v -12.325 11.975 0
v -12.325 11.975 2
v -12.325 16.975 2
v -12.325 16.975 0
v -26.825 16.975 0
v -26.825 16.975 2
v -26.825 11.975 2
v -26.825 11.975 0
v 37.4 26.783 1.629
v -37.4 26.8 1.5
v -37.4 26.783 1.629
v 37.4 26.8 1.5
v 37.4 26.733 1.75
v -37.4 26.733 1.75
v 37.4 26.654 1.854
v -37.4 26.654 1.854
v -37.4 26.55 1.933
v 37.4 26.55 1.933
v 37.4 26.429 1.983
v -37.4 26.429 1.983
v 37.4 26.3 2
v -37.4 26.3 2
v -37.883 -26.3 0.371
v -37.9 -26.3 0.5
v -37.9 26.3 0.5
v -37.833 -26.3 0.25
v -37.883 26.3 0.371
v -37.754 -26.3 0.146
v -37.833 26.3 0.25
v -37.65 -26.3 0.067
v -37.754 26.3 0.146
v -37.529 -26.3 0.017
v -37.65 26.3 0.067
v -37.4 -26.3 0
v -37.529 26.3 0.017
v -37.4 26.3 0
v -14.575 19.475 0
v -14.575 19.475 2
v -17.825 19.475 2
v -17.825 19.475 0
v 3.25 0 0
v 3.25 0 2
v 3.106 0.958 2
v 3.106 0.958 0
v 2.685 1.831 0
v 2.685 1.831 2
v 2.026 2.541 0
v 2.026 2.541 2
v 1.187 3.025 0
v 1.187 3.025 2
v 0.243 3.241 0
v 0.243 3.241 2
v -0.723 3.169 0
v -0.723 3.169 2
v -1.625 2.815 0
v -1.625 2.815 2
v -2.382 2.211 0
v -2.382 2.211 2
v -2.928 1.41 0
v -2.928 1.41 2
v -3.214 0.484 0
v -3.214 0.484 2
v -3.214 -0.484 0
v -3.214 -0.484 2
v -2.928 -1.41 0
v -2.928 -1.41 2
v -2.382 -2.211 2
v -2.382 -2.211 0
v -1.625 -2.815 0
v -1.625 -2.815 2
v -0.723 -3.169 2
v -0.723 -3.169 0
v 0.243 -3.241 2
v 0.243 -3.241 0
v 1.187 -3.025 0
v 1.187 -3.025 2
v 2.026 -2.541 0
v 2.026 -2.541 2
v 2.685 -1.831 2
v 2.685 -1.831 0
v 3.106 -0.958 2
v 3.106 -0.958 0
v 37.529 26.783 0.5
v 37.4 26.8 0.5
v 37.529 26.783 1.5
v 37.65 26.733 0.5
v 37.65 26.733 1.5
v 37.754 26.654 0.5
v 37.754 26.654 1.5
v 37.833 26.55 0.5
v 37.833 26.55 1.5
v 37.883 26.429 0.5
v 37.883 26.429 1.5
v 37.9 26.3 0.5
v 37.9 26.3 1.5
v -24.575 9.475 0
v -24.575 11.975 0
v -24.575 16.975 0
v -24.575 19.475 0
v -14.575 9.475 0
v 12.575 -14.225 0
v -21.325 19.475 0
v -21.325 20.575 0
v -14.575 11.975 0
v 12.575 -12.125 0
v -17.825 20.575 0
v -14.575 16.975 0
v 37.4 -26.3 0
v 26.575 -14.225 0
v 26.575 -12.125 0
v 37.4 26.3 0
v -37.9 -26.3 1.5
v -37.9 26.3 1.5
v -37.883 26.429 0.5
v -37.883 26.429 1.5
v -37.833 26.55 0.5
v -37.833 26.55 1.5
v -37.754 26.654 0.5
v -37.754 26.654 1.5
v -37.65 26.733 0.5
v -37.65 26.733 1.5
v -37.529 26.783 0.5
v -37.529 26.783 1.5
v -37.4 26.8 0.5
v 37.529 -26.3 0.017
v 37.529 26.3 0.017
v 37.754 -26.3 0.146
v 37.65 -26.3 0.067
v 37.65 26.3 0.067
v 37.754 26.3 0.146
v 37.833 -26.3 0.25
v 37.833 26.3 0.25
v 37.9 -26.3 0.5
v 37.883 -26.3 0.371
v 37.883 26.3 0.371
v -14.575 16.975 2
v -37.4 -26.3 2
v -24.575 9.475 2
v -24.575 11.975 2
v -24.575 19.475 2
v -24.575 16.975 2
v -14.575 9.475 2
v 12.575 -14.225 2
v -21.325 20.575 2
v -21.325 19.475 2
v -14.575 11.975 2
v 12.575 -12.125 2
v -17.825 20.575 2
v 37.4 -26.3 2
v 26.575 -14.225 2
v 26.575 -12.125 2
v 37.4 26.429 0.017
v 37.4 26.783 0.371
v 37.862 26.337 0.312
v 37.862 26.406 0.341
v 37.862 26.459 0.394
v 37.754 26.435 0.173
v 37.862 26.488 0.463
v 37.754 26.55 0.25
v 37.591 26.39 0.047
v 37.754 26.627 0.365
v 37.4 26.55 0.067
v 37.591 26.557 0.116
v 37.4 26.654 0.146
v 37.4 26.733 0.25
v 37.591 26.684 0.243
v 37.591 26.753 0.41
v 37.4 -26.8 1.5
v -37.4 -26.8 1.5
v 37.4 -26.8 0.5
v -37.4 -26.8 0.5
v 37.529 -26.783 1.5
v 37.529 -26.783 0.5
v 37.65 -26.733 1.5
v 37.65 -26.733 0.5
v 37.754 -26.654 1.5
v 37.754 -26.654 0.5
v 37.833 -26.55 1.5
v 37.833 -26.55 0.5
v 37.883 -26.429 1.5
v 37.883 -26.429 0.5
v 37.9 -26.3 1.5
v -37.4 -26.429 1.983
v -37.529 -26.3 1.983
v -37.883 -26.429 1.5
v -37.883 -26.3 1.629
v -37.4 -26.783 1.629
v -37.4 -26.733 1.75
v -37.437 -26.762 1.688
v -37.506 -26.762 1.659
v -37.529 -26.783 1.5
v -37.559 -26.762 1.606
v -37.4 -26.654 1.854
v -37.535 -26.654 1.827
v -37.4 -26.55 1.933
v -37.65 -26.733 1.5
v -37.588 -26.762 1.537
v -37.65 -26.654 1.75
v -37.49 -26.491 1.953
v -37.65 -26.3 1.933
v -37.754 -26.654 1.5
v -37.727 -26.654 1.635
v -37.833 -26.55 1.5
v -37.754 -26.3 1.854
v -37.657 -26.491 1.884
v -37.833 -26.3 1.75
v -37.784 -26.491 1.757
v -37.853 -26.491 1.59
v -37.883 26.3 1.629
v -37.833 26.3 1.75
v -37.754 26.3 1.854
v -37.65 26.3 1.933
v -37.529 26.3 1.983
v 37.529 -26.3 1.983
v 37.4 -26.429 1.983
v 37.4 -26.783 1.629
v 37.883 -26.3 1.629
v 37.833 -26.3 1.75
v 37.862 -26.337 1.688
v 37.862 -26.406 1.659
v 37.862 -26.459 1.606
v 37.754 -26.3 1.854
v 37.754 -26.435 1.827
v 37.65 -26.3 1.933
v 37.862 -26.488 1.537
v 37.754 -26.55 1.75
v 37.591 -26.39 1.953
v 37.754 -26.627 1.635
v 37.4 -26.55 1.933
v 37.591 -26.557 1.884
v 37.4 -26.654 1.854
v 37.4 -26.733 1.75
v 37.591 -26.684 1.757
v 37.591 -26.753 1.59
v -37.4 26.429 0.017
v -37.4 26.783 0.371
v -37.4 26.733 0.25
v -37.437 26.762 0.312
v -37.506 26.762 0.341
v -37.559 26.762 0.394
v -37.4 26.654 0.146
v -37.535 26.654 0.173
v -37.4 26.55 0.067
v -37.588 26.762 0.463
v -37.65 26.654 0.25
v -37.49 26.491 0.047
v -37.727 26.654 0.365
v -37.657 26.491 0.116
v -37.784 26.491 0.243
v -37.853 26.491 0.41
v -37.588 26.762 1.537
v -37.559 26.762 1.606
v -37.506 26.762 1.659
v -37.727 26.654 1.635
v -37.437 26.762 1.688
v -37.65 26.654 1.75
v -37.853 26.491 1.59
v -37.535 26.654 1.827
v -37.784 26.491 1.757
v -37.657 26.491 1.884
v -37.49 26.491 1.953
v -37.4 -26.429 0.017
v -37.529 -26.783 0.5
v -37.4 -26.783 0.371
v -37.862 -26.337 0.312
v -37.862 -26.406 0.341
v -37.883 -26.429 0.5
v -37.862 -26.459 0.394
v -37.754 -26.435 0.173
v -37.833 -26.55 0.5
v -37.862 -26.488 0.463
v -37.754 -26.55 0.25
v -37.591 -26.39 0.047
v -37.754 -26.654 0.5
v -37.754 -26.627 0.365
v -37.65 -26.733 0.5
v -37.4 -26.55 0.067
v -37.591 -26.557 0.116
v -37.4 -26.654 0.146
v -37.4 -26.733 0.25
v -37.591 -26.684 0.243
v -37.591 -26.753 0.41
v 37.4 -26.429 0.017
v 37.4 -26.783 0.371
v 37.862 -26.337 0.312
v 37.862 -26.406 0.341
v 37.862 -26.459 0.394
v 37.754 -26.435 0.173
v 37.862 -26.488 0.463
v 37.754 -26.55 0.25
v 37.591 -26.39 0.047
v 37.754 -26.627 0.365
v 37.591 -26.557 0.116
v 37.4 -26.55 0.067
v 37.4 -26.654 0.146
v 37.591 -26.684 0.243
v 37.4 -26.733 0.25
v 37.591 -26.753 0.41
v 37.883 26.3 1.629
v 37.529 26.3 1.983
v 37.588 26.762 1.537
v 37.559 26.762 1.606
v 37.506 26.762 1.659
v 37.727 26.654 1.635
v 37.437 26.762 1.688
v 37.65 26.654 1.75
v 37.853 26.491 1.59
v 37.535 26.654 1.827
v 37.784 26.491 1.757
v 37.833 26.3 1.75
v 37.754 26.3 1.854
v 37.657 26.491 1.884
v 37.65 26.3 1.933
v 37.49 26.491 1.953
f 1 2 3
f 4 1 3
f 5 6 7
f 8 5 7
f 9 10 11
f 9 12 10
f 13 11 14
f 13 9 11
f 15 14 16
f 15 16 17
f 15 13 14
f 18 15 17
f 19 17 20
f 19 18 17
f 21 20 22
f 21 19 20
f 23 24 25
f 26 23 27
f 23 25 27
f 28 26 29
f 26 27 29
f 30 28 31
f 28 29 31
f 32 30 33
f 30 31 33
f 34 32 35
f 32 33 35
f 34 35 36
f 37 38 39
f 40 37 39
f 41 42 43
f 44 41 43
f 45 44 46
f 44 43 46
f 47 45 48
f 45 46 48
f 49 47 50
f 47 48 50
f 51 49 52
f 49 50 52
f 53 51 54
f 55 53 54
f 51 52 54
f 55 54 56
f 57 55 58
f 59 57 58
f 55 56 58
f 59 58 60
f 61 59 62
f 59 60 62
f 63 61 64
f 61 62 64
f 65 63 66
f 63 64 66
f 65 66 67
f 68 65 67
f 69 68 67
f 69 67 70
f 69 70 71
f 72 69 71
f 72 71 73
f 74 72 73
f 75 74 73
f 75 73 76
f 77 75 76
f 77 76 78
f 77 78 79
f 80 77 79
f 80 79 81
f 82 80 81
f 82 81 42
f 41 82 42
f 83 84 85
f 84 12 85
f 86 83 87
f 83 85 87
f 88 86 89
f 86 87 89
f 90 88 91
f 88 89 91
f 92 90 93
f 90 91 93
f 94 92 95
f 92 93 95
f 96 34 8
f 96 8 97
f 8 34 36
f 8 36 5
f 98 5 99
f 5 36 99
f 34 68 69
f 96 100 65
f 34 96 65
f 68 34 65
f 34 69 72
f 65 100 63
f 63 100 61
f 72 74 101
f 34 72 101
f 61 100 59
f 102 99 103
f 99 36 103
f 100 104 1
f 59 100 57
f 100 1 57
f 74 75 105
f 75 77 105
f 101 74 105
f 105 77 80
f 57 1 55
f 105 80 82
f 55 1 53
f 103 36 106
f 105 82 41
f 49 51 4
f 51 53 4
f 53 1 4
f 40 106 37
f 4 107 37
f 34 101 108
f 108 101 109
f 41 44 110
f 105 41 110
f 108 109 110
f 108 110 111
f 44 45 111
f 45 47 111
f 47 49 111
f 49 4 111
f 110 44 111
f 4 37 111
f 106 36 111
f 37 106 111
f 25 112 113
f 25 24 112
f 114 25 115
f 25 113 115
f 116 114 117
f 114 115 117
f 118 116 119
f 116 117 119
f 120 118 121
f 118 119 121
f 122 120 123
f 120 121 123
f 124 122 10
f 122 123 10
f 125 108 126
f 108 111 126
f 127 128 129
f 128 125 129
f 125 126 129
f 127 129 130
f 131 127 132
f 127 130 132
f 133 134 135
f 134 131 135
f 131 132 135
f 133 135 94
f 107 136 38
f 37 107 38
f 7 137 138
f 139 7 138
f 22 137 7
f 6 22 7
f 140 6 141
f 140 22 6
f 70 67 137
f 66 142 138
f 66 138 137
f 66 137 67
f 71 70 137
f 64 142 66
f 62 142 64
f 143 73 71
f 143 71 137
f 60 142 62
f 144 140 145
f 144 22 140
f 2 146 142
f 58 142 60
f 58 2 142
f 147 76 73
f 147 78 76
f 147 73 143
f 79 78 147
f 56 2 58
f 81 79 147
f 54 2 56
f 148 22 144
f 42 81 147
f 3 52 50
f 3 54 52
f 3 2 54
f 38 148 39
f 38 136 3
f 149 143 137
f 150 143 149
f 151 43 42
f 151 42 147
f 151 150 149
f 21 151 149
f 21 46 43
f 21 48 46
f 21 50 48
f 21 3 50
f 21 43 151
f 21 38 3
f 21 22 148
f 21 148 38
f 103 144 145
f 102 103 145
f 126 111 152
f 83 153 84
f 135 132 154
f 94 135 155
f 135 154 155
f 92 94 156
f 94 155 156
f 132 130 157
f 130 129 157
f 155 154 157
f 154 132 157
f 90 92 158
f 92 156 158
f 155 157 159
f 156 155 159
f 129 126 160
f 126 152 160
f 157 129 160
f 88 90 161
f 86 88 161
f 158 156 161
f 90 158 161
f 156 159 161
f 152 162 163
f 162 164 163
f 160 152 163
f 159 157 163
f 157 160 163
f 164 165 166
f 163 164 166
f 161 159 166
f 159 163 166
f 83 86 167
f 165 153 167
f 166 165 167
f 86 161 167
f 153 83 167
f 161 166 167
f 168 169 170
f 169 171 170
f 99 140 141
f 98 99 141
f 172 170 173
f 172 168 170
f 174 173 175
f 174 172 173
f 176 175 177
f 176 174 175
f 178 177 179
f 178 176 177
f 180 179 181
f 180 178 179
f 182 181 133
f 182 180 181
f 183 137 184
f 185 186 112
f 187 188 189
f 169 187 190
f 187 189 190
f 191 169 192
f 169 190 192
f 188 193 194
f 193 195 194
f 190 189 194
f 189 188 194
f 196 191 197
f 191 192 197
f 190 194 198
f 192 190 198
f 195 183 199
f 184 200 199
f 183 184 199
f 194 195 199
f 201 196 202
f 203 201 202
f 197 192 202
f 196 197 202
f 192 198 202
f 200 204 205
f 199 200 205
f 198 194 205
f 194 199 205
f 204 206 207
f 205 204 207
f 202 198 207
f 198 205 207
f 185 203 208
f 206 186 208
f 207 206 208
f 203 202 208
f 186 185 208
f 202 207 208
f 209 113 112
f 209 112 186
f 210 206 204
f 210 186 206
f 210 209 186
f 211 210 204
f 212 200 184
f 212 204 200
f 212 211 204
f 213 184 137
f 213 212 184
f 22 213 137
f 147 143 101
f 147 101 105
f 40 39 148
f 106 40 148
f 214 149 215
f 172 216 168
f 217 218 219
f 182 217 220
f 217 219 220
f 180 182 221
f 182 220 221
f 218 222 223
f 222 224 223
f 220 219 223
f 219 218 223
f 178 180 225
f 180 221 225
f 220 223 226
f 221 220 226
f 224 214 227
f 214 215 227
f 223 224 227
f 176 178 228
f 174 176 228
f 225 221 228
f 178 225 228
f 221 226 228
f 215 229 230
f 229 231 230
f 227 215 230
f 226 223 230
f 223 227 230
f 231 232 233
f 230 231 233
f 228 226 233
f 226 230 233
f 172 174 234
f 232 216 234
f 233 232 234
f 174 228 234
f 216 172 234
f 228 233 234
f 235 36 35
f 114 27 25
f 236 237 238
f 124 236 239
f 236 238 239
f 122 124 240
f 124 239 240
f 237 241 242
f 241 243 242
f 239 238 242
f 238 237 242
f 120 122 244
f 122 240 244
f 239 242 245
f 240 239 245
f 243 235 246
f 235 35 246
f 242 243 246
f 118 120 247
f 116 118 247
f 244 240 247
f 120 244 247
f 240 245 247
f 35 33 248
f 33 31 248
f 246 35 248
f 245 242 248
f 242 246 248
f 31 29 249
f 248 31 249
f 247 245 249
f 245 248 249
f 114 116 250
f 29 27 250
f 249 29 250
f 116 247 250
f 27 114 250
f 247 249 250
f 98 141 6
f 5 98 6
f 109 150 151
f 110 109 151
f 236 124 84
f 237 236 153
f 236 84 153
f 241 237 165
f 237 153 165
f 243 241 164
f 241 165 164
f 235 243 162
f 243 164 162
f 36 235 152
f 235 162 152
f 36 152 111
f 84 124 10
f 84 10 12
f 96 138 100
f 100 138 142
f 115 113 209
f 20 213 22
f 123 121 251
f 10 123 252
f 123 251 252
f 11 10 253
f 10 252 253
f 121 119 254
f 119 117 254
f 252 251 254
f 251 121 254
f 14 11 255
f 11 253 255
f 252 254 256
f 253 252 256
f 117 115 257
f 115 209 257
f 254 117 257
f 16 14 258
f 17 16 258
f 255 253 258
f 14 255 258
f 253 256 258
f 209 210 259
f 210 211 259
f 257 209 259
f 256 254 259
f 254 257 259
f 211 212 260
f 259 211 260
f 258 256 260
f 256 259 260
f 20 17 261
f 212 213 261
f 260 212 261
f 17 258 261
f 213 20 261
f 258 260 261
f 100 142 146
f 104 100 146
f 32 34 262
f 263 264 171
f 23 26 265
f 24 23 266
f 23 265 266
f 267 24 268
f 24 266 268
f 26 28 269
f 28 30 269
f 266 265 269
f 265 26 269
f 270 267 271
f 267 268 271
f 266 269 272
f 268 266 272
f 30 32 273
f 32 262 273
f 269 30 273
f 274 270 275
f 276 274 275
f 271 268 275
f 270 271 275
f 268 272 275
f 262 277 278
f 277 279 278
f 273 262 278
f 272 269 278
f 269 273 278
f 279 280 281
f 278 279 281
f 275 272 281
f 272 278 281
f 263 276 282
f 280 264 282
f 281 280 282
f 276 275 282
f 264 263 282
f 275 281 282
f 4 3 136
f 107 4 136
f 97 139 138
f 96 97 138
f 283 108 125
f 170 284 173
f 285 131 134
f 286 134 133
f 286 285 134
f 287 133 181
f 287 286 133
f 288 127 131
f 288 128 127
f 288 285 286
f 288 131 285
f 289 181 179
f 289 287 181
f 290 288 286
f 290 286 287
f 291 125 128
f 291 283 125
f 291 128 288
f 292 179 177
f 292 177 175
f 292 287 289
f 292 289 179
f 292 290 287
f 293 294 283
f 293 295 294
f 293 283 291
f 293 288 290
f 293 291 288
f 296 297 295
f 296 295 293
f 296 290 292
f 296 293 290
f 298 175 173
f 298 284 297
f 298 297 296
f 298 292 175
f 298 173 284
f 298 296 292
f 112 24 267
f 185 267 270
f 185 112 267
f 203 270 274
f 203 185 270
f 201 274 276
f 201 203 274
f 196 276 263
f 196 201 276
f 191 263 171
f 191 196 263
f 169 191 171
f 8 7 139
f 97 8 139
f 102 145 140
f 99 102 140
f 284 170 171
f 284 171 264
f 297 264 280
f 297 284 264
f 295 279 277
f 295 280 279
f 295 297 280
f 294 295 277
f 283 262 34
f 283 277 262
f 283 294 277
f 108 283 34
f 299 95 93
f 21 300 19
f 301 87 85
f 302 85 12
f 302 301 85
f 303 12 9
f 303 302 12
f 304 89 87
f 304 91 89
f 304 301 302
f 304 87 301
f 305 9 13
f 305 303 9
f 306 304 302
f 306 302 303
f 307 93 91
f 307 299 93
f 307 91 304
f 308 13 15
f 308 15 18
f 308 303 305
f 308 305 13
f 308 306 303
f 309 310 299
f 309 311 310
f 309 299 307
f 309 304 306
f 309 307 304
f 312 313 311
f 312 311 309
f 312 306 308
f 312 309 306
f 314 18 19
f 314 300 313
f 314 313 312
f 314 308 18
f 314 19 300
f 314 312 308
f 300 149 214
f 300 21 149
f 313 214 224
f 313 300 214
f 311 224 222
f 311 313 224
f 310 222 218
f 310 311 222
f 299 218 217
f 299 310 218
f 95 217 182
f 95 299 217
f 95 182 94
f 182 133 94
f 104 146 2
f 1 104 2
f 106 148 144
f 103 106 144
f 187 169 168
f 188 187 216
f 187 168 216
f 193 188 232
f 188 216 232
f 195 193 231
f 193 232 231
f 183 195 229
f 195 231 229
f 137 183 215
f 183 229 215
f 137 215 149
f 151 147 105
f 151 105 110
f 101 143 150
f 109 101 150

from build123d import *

# Parameters (mm, degrees)
SKETCH1_W           = 75.8
SKETCH1_H           = 53.6
BOSS_EXTRUDE1_DEPTH = 2
SKETCH5_W           = 14
SKETCH5_H           = 2.1
SKETCH5_R           = 3.25
CUT_EXTRUDE1_DEPTH  = 47.461274197
FILLET1_R           = 0.5


with BuildPart() as part:
    # Sketch1 → Boss-Extrude1 (new body)
    with BuildSketch(Plane.XY):
        Rectangle(SKETCH1_W, SKETCH1_H)
    extrude(amount=BOSS_EXTRUDE1_DEPTH)

    # Sketch5 → Cut-Extrude1 (cut, through all)
    with BuildSketch(Plane.XY.offset(2)):
        Polygon((-24.575, 9.475), (-14.575, 9.475), (-14.575, 11.975), (-12.325, 11.975), (-12.325, 16.975), (-14.575, 16.975), (-14.575, 19.475), (-17.825, 19.475), (-17.825, 20.575), (-21.325, 20.575), (-21.325, 19.475), (-24.575, 19.475), (-24.575, 16.975), (-26.825, 16.975), (-26.825, 11.975), (-24.575, 11.975), align=None)
        with Locations((19.575, -13.175)):
            Rectangle(SKETCH5_W, SKETCH5_H)
        Circle(SKETCH5_R)
    extrude(amount=-CUT_EXTRUDE1_DEPTH, mode=Mode.SUBTRACT)

    # Fillet1
    fillet1_edges = [part.edges().sort_by_distance(p)[0] for p in [
        (-37.9, 0, 2),
        (0, -26.8, 2),
        (37.9, 0, 2),
        (0, -26.8, 0),
        (-37.9, 0, 0),
        (0, 26.8, 0),
        (37.9, 0, 0),
        (37.9, -26.8, 1),
        (-37.9, -26.8, 1),
        (-37.9, 26.8, 1),
        (37.9, 26.8, 1),
        (0, 26.8, 2),
    ]]
    fillet(fillet1_edges, radius=FILLET1_R)


solid = part.part
